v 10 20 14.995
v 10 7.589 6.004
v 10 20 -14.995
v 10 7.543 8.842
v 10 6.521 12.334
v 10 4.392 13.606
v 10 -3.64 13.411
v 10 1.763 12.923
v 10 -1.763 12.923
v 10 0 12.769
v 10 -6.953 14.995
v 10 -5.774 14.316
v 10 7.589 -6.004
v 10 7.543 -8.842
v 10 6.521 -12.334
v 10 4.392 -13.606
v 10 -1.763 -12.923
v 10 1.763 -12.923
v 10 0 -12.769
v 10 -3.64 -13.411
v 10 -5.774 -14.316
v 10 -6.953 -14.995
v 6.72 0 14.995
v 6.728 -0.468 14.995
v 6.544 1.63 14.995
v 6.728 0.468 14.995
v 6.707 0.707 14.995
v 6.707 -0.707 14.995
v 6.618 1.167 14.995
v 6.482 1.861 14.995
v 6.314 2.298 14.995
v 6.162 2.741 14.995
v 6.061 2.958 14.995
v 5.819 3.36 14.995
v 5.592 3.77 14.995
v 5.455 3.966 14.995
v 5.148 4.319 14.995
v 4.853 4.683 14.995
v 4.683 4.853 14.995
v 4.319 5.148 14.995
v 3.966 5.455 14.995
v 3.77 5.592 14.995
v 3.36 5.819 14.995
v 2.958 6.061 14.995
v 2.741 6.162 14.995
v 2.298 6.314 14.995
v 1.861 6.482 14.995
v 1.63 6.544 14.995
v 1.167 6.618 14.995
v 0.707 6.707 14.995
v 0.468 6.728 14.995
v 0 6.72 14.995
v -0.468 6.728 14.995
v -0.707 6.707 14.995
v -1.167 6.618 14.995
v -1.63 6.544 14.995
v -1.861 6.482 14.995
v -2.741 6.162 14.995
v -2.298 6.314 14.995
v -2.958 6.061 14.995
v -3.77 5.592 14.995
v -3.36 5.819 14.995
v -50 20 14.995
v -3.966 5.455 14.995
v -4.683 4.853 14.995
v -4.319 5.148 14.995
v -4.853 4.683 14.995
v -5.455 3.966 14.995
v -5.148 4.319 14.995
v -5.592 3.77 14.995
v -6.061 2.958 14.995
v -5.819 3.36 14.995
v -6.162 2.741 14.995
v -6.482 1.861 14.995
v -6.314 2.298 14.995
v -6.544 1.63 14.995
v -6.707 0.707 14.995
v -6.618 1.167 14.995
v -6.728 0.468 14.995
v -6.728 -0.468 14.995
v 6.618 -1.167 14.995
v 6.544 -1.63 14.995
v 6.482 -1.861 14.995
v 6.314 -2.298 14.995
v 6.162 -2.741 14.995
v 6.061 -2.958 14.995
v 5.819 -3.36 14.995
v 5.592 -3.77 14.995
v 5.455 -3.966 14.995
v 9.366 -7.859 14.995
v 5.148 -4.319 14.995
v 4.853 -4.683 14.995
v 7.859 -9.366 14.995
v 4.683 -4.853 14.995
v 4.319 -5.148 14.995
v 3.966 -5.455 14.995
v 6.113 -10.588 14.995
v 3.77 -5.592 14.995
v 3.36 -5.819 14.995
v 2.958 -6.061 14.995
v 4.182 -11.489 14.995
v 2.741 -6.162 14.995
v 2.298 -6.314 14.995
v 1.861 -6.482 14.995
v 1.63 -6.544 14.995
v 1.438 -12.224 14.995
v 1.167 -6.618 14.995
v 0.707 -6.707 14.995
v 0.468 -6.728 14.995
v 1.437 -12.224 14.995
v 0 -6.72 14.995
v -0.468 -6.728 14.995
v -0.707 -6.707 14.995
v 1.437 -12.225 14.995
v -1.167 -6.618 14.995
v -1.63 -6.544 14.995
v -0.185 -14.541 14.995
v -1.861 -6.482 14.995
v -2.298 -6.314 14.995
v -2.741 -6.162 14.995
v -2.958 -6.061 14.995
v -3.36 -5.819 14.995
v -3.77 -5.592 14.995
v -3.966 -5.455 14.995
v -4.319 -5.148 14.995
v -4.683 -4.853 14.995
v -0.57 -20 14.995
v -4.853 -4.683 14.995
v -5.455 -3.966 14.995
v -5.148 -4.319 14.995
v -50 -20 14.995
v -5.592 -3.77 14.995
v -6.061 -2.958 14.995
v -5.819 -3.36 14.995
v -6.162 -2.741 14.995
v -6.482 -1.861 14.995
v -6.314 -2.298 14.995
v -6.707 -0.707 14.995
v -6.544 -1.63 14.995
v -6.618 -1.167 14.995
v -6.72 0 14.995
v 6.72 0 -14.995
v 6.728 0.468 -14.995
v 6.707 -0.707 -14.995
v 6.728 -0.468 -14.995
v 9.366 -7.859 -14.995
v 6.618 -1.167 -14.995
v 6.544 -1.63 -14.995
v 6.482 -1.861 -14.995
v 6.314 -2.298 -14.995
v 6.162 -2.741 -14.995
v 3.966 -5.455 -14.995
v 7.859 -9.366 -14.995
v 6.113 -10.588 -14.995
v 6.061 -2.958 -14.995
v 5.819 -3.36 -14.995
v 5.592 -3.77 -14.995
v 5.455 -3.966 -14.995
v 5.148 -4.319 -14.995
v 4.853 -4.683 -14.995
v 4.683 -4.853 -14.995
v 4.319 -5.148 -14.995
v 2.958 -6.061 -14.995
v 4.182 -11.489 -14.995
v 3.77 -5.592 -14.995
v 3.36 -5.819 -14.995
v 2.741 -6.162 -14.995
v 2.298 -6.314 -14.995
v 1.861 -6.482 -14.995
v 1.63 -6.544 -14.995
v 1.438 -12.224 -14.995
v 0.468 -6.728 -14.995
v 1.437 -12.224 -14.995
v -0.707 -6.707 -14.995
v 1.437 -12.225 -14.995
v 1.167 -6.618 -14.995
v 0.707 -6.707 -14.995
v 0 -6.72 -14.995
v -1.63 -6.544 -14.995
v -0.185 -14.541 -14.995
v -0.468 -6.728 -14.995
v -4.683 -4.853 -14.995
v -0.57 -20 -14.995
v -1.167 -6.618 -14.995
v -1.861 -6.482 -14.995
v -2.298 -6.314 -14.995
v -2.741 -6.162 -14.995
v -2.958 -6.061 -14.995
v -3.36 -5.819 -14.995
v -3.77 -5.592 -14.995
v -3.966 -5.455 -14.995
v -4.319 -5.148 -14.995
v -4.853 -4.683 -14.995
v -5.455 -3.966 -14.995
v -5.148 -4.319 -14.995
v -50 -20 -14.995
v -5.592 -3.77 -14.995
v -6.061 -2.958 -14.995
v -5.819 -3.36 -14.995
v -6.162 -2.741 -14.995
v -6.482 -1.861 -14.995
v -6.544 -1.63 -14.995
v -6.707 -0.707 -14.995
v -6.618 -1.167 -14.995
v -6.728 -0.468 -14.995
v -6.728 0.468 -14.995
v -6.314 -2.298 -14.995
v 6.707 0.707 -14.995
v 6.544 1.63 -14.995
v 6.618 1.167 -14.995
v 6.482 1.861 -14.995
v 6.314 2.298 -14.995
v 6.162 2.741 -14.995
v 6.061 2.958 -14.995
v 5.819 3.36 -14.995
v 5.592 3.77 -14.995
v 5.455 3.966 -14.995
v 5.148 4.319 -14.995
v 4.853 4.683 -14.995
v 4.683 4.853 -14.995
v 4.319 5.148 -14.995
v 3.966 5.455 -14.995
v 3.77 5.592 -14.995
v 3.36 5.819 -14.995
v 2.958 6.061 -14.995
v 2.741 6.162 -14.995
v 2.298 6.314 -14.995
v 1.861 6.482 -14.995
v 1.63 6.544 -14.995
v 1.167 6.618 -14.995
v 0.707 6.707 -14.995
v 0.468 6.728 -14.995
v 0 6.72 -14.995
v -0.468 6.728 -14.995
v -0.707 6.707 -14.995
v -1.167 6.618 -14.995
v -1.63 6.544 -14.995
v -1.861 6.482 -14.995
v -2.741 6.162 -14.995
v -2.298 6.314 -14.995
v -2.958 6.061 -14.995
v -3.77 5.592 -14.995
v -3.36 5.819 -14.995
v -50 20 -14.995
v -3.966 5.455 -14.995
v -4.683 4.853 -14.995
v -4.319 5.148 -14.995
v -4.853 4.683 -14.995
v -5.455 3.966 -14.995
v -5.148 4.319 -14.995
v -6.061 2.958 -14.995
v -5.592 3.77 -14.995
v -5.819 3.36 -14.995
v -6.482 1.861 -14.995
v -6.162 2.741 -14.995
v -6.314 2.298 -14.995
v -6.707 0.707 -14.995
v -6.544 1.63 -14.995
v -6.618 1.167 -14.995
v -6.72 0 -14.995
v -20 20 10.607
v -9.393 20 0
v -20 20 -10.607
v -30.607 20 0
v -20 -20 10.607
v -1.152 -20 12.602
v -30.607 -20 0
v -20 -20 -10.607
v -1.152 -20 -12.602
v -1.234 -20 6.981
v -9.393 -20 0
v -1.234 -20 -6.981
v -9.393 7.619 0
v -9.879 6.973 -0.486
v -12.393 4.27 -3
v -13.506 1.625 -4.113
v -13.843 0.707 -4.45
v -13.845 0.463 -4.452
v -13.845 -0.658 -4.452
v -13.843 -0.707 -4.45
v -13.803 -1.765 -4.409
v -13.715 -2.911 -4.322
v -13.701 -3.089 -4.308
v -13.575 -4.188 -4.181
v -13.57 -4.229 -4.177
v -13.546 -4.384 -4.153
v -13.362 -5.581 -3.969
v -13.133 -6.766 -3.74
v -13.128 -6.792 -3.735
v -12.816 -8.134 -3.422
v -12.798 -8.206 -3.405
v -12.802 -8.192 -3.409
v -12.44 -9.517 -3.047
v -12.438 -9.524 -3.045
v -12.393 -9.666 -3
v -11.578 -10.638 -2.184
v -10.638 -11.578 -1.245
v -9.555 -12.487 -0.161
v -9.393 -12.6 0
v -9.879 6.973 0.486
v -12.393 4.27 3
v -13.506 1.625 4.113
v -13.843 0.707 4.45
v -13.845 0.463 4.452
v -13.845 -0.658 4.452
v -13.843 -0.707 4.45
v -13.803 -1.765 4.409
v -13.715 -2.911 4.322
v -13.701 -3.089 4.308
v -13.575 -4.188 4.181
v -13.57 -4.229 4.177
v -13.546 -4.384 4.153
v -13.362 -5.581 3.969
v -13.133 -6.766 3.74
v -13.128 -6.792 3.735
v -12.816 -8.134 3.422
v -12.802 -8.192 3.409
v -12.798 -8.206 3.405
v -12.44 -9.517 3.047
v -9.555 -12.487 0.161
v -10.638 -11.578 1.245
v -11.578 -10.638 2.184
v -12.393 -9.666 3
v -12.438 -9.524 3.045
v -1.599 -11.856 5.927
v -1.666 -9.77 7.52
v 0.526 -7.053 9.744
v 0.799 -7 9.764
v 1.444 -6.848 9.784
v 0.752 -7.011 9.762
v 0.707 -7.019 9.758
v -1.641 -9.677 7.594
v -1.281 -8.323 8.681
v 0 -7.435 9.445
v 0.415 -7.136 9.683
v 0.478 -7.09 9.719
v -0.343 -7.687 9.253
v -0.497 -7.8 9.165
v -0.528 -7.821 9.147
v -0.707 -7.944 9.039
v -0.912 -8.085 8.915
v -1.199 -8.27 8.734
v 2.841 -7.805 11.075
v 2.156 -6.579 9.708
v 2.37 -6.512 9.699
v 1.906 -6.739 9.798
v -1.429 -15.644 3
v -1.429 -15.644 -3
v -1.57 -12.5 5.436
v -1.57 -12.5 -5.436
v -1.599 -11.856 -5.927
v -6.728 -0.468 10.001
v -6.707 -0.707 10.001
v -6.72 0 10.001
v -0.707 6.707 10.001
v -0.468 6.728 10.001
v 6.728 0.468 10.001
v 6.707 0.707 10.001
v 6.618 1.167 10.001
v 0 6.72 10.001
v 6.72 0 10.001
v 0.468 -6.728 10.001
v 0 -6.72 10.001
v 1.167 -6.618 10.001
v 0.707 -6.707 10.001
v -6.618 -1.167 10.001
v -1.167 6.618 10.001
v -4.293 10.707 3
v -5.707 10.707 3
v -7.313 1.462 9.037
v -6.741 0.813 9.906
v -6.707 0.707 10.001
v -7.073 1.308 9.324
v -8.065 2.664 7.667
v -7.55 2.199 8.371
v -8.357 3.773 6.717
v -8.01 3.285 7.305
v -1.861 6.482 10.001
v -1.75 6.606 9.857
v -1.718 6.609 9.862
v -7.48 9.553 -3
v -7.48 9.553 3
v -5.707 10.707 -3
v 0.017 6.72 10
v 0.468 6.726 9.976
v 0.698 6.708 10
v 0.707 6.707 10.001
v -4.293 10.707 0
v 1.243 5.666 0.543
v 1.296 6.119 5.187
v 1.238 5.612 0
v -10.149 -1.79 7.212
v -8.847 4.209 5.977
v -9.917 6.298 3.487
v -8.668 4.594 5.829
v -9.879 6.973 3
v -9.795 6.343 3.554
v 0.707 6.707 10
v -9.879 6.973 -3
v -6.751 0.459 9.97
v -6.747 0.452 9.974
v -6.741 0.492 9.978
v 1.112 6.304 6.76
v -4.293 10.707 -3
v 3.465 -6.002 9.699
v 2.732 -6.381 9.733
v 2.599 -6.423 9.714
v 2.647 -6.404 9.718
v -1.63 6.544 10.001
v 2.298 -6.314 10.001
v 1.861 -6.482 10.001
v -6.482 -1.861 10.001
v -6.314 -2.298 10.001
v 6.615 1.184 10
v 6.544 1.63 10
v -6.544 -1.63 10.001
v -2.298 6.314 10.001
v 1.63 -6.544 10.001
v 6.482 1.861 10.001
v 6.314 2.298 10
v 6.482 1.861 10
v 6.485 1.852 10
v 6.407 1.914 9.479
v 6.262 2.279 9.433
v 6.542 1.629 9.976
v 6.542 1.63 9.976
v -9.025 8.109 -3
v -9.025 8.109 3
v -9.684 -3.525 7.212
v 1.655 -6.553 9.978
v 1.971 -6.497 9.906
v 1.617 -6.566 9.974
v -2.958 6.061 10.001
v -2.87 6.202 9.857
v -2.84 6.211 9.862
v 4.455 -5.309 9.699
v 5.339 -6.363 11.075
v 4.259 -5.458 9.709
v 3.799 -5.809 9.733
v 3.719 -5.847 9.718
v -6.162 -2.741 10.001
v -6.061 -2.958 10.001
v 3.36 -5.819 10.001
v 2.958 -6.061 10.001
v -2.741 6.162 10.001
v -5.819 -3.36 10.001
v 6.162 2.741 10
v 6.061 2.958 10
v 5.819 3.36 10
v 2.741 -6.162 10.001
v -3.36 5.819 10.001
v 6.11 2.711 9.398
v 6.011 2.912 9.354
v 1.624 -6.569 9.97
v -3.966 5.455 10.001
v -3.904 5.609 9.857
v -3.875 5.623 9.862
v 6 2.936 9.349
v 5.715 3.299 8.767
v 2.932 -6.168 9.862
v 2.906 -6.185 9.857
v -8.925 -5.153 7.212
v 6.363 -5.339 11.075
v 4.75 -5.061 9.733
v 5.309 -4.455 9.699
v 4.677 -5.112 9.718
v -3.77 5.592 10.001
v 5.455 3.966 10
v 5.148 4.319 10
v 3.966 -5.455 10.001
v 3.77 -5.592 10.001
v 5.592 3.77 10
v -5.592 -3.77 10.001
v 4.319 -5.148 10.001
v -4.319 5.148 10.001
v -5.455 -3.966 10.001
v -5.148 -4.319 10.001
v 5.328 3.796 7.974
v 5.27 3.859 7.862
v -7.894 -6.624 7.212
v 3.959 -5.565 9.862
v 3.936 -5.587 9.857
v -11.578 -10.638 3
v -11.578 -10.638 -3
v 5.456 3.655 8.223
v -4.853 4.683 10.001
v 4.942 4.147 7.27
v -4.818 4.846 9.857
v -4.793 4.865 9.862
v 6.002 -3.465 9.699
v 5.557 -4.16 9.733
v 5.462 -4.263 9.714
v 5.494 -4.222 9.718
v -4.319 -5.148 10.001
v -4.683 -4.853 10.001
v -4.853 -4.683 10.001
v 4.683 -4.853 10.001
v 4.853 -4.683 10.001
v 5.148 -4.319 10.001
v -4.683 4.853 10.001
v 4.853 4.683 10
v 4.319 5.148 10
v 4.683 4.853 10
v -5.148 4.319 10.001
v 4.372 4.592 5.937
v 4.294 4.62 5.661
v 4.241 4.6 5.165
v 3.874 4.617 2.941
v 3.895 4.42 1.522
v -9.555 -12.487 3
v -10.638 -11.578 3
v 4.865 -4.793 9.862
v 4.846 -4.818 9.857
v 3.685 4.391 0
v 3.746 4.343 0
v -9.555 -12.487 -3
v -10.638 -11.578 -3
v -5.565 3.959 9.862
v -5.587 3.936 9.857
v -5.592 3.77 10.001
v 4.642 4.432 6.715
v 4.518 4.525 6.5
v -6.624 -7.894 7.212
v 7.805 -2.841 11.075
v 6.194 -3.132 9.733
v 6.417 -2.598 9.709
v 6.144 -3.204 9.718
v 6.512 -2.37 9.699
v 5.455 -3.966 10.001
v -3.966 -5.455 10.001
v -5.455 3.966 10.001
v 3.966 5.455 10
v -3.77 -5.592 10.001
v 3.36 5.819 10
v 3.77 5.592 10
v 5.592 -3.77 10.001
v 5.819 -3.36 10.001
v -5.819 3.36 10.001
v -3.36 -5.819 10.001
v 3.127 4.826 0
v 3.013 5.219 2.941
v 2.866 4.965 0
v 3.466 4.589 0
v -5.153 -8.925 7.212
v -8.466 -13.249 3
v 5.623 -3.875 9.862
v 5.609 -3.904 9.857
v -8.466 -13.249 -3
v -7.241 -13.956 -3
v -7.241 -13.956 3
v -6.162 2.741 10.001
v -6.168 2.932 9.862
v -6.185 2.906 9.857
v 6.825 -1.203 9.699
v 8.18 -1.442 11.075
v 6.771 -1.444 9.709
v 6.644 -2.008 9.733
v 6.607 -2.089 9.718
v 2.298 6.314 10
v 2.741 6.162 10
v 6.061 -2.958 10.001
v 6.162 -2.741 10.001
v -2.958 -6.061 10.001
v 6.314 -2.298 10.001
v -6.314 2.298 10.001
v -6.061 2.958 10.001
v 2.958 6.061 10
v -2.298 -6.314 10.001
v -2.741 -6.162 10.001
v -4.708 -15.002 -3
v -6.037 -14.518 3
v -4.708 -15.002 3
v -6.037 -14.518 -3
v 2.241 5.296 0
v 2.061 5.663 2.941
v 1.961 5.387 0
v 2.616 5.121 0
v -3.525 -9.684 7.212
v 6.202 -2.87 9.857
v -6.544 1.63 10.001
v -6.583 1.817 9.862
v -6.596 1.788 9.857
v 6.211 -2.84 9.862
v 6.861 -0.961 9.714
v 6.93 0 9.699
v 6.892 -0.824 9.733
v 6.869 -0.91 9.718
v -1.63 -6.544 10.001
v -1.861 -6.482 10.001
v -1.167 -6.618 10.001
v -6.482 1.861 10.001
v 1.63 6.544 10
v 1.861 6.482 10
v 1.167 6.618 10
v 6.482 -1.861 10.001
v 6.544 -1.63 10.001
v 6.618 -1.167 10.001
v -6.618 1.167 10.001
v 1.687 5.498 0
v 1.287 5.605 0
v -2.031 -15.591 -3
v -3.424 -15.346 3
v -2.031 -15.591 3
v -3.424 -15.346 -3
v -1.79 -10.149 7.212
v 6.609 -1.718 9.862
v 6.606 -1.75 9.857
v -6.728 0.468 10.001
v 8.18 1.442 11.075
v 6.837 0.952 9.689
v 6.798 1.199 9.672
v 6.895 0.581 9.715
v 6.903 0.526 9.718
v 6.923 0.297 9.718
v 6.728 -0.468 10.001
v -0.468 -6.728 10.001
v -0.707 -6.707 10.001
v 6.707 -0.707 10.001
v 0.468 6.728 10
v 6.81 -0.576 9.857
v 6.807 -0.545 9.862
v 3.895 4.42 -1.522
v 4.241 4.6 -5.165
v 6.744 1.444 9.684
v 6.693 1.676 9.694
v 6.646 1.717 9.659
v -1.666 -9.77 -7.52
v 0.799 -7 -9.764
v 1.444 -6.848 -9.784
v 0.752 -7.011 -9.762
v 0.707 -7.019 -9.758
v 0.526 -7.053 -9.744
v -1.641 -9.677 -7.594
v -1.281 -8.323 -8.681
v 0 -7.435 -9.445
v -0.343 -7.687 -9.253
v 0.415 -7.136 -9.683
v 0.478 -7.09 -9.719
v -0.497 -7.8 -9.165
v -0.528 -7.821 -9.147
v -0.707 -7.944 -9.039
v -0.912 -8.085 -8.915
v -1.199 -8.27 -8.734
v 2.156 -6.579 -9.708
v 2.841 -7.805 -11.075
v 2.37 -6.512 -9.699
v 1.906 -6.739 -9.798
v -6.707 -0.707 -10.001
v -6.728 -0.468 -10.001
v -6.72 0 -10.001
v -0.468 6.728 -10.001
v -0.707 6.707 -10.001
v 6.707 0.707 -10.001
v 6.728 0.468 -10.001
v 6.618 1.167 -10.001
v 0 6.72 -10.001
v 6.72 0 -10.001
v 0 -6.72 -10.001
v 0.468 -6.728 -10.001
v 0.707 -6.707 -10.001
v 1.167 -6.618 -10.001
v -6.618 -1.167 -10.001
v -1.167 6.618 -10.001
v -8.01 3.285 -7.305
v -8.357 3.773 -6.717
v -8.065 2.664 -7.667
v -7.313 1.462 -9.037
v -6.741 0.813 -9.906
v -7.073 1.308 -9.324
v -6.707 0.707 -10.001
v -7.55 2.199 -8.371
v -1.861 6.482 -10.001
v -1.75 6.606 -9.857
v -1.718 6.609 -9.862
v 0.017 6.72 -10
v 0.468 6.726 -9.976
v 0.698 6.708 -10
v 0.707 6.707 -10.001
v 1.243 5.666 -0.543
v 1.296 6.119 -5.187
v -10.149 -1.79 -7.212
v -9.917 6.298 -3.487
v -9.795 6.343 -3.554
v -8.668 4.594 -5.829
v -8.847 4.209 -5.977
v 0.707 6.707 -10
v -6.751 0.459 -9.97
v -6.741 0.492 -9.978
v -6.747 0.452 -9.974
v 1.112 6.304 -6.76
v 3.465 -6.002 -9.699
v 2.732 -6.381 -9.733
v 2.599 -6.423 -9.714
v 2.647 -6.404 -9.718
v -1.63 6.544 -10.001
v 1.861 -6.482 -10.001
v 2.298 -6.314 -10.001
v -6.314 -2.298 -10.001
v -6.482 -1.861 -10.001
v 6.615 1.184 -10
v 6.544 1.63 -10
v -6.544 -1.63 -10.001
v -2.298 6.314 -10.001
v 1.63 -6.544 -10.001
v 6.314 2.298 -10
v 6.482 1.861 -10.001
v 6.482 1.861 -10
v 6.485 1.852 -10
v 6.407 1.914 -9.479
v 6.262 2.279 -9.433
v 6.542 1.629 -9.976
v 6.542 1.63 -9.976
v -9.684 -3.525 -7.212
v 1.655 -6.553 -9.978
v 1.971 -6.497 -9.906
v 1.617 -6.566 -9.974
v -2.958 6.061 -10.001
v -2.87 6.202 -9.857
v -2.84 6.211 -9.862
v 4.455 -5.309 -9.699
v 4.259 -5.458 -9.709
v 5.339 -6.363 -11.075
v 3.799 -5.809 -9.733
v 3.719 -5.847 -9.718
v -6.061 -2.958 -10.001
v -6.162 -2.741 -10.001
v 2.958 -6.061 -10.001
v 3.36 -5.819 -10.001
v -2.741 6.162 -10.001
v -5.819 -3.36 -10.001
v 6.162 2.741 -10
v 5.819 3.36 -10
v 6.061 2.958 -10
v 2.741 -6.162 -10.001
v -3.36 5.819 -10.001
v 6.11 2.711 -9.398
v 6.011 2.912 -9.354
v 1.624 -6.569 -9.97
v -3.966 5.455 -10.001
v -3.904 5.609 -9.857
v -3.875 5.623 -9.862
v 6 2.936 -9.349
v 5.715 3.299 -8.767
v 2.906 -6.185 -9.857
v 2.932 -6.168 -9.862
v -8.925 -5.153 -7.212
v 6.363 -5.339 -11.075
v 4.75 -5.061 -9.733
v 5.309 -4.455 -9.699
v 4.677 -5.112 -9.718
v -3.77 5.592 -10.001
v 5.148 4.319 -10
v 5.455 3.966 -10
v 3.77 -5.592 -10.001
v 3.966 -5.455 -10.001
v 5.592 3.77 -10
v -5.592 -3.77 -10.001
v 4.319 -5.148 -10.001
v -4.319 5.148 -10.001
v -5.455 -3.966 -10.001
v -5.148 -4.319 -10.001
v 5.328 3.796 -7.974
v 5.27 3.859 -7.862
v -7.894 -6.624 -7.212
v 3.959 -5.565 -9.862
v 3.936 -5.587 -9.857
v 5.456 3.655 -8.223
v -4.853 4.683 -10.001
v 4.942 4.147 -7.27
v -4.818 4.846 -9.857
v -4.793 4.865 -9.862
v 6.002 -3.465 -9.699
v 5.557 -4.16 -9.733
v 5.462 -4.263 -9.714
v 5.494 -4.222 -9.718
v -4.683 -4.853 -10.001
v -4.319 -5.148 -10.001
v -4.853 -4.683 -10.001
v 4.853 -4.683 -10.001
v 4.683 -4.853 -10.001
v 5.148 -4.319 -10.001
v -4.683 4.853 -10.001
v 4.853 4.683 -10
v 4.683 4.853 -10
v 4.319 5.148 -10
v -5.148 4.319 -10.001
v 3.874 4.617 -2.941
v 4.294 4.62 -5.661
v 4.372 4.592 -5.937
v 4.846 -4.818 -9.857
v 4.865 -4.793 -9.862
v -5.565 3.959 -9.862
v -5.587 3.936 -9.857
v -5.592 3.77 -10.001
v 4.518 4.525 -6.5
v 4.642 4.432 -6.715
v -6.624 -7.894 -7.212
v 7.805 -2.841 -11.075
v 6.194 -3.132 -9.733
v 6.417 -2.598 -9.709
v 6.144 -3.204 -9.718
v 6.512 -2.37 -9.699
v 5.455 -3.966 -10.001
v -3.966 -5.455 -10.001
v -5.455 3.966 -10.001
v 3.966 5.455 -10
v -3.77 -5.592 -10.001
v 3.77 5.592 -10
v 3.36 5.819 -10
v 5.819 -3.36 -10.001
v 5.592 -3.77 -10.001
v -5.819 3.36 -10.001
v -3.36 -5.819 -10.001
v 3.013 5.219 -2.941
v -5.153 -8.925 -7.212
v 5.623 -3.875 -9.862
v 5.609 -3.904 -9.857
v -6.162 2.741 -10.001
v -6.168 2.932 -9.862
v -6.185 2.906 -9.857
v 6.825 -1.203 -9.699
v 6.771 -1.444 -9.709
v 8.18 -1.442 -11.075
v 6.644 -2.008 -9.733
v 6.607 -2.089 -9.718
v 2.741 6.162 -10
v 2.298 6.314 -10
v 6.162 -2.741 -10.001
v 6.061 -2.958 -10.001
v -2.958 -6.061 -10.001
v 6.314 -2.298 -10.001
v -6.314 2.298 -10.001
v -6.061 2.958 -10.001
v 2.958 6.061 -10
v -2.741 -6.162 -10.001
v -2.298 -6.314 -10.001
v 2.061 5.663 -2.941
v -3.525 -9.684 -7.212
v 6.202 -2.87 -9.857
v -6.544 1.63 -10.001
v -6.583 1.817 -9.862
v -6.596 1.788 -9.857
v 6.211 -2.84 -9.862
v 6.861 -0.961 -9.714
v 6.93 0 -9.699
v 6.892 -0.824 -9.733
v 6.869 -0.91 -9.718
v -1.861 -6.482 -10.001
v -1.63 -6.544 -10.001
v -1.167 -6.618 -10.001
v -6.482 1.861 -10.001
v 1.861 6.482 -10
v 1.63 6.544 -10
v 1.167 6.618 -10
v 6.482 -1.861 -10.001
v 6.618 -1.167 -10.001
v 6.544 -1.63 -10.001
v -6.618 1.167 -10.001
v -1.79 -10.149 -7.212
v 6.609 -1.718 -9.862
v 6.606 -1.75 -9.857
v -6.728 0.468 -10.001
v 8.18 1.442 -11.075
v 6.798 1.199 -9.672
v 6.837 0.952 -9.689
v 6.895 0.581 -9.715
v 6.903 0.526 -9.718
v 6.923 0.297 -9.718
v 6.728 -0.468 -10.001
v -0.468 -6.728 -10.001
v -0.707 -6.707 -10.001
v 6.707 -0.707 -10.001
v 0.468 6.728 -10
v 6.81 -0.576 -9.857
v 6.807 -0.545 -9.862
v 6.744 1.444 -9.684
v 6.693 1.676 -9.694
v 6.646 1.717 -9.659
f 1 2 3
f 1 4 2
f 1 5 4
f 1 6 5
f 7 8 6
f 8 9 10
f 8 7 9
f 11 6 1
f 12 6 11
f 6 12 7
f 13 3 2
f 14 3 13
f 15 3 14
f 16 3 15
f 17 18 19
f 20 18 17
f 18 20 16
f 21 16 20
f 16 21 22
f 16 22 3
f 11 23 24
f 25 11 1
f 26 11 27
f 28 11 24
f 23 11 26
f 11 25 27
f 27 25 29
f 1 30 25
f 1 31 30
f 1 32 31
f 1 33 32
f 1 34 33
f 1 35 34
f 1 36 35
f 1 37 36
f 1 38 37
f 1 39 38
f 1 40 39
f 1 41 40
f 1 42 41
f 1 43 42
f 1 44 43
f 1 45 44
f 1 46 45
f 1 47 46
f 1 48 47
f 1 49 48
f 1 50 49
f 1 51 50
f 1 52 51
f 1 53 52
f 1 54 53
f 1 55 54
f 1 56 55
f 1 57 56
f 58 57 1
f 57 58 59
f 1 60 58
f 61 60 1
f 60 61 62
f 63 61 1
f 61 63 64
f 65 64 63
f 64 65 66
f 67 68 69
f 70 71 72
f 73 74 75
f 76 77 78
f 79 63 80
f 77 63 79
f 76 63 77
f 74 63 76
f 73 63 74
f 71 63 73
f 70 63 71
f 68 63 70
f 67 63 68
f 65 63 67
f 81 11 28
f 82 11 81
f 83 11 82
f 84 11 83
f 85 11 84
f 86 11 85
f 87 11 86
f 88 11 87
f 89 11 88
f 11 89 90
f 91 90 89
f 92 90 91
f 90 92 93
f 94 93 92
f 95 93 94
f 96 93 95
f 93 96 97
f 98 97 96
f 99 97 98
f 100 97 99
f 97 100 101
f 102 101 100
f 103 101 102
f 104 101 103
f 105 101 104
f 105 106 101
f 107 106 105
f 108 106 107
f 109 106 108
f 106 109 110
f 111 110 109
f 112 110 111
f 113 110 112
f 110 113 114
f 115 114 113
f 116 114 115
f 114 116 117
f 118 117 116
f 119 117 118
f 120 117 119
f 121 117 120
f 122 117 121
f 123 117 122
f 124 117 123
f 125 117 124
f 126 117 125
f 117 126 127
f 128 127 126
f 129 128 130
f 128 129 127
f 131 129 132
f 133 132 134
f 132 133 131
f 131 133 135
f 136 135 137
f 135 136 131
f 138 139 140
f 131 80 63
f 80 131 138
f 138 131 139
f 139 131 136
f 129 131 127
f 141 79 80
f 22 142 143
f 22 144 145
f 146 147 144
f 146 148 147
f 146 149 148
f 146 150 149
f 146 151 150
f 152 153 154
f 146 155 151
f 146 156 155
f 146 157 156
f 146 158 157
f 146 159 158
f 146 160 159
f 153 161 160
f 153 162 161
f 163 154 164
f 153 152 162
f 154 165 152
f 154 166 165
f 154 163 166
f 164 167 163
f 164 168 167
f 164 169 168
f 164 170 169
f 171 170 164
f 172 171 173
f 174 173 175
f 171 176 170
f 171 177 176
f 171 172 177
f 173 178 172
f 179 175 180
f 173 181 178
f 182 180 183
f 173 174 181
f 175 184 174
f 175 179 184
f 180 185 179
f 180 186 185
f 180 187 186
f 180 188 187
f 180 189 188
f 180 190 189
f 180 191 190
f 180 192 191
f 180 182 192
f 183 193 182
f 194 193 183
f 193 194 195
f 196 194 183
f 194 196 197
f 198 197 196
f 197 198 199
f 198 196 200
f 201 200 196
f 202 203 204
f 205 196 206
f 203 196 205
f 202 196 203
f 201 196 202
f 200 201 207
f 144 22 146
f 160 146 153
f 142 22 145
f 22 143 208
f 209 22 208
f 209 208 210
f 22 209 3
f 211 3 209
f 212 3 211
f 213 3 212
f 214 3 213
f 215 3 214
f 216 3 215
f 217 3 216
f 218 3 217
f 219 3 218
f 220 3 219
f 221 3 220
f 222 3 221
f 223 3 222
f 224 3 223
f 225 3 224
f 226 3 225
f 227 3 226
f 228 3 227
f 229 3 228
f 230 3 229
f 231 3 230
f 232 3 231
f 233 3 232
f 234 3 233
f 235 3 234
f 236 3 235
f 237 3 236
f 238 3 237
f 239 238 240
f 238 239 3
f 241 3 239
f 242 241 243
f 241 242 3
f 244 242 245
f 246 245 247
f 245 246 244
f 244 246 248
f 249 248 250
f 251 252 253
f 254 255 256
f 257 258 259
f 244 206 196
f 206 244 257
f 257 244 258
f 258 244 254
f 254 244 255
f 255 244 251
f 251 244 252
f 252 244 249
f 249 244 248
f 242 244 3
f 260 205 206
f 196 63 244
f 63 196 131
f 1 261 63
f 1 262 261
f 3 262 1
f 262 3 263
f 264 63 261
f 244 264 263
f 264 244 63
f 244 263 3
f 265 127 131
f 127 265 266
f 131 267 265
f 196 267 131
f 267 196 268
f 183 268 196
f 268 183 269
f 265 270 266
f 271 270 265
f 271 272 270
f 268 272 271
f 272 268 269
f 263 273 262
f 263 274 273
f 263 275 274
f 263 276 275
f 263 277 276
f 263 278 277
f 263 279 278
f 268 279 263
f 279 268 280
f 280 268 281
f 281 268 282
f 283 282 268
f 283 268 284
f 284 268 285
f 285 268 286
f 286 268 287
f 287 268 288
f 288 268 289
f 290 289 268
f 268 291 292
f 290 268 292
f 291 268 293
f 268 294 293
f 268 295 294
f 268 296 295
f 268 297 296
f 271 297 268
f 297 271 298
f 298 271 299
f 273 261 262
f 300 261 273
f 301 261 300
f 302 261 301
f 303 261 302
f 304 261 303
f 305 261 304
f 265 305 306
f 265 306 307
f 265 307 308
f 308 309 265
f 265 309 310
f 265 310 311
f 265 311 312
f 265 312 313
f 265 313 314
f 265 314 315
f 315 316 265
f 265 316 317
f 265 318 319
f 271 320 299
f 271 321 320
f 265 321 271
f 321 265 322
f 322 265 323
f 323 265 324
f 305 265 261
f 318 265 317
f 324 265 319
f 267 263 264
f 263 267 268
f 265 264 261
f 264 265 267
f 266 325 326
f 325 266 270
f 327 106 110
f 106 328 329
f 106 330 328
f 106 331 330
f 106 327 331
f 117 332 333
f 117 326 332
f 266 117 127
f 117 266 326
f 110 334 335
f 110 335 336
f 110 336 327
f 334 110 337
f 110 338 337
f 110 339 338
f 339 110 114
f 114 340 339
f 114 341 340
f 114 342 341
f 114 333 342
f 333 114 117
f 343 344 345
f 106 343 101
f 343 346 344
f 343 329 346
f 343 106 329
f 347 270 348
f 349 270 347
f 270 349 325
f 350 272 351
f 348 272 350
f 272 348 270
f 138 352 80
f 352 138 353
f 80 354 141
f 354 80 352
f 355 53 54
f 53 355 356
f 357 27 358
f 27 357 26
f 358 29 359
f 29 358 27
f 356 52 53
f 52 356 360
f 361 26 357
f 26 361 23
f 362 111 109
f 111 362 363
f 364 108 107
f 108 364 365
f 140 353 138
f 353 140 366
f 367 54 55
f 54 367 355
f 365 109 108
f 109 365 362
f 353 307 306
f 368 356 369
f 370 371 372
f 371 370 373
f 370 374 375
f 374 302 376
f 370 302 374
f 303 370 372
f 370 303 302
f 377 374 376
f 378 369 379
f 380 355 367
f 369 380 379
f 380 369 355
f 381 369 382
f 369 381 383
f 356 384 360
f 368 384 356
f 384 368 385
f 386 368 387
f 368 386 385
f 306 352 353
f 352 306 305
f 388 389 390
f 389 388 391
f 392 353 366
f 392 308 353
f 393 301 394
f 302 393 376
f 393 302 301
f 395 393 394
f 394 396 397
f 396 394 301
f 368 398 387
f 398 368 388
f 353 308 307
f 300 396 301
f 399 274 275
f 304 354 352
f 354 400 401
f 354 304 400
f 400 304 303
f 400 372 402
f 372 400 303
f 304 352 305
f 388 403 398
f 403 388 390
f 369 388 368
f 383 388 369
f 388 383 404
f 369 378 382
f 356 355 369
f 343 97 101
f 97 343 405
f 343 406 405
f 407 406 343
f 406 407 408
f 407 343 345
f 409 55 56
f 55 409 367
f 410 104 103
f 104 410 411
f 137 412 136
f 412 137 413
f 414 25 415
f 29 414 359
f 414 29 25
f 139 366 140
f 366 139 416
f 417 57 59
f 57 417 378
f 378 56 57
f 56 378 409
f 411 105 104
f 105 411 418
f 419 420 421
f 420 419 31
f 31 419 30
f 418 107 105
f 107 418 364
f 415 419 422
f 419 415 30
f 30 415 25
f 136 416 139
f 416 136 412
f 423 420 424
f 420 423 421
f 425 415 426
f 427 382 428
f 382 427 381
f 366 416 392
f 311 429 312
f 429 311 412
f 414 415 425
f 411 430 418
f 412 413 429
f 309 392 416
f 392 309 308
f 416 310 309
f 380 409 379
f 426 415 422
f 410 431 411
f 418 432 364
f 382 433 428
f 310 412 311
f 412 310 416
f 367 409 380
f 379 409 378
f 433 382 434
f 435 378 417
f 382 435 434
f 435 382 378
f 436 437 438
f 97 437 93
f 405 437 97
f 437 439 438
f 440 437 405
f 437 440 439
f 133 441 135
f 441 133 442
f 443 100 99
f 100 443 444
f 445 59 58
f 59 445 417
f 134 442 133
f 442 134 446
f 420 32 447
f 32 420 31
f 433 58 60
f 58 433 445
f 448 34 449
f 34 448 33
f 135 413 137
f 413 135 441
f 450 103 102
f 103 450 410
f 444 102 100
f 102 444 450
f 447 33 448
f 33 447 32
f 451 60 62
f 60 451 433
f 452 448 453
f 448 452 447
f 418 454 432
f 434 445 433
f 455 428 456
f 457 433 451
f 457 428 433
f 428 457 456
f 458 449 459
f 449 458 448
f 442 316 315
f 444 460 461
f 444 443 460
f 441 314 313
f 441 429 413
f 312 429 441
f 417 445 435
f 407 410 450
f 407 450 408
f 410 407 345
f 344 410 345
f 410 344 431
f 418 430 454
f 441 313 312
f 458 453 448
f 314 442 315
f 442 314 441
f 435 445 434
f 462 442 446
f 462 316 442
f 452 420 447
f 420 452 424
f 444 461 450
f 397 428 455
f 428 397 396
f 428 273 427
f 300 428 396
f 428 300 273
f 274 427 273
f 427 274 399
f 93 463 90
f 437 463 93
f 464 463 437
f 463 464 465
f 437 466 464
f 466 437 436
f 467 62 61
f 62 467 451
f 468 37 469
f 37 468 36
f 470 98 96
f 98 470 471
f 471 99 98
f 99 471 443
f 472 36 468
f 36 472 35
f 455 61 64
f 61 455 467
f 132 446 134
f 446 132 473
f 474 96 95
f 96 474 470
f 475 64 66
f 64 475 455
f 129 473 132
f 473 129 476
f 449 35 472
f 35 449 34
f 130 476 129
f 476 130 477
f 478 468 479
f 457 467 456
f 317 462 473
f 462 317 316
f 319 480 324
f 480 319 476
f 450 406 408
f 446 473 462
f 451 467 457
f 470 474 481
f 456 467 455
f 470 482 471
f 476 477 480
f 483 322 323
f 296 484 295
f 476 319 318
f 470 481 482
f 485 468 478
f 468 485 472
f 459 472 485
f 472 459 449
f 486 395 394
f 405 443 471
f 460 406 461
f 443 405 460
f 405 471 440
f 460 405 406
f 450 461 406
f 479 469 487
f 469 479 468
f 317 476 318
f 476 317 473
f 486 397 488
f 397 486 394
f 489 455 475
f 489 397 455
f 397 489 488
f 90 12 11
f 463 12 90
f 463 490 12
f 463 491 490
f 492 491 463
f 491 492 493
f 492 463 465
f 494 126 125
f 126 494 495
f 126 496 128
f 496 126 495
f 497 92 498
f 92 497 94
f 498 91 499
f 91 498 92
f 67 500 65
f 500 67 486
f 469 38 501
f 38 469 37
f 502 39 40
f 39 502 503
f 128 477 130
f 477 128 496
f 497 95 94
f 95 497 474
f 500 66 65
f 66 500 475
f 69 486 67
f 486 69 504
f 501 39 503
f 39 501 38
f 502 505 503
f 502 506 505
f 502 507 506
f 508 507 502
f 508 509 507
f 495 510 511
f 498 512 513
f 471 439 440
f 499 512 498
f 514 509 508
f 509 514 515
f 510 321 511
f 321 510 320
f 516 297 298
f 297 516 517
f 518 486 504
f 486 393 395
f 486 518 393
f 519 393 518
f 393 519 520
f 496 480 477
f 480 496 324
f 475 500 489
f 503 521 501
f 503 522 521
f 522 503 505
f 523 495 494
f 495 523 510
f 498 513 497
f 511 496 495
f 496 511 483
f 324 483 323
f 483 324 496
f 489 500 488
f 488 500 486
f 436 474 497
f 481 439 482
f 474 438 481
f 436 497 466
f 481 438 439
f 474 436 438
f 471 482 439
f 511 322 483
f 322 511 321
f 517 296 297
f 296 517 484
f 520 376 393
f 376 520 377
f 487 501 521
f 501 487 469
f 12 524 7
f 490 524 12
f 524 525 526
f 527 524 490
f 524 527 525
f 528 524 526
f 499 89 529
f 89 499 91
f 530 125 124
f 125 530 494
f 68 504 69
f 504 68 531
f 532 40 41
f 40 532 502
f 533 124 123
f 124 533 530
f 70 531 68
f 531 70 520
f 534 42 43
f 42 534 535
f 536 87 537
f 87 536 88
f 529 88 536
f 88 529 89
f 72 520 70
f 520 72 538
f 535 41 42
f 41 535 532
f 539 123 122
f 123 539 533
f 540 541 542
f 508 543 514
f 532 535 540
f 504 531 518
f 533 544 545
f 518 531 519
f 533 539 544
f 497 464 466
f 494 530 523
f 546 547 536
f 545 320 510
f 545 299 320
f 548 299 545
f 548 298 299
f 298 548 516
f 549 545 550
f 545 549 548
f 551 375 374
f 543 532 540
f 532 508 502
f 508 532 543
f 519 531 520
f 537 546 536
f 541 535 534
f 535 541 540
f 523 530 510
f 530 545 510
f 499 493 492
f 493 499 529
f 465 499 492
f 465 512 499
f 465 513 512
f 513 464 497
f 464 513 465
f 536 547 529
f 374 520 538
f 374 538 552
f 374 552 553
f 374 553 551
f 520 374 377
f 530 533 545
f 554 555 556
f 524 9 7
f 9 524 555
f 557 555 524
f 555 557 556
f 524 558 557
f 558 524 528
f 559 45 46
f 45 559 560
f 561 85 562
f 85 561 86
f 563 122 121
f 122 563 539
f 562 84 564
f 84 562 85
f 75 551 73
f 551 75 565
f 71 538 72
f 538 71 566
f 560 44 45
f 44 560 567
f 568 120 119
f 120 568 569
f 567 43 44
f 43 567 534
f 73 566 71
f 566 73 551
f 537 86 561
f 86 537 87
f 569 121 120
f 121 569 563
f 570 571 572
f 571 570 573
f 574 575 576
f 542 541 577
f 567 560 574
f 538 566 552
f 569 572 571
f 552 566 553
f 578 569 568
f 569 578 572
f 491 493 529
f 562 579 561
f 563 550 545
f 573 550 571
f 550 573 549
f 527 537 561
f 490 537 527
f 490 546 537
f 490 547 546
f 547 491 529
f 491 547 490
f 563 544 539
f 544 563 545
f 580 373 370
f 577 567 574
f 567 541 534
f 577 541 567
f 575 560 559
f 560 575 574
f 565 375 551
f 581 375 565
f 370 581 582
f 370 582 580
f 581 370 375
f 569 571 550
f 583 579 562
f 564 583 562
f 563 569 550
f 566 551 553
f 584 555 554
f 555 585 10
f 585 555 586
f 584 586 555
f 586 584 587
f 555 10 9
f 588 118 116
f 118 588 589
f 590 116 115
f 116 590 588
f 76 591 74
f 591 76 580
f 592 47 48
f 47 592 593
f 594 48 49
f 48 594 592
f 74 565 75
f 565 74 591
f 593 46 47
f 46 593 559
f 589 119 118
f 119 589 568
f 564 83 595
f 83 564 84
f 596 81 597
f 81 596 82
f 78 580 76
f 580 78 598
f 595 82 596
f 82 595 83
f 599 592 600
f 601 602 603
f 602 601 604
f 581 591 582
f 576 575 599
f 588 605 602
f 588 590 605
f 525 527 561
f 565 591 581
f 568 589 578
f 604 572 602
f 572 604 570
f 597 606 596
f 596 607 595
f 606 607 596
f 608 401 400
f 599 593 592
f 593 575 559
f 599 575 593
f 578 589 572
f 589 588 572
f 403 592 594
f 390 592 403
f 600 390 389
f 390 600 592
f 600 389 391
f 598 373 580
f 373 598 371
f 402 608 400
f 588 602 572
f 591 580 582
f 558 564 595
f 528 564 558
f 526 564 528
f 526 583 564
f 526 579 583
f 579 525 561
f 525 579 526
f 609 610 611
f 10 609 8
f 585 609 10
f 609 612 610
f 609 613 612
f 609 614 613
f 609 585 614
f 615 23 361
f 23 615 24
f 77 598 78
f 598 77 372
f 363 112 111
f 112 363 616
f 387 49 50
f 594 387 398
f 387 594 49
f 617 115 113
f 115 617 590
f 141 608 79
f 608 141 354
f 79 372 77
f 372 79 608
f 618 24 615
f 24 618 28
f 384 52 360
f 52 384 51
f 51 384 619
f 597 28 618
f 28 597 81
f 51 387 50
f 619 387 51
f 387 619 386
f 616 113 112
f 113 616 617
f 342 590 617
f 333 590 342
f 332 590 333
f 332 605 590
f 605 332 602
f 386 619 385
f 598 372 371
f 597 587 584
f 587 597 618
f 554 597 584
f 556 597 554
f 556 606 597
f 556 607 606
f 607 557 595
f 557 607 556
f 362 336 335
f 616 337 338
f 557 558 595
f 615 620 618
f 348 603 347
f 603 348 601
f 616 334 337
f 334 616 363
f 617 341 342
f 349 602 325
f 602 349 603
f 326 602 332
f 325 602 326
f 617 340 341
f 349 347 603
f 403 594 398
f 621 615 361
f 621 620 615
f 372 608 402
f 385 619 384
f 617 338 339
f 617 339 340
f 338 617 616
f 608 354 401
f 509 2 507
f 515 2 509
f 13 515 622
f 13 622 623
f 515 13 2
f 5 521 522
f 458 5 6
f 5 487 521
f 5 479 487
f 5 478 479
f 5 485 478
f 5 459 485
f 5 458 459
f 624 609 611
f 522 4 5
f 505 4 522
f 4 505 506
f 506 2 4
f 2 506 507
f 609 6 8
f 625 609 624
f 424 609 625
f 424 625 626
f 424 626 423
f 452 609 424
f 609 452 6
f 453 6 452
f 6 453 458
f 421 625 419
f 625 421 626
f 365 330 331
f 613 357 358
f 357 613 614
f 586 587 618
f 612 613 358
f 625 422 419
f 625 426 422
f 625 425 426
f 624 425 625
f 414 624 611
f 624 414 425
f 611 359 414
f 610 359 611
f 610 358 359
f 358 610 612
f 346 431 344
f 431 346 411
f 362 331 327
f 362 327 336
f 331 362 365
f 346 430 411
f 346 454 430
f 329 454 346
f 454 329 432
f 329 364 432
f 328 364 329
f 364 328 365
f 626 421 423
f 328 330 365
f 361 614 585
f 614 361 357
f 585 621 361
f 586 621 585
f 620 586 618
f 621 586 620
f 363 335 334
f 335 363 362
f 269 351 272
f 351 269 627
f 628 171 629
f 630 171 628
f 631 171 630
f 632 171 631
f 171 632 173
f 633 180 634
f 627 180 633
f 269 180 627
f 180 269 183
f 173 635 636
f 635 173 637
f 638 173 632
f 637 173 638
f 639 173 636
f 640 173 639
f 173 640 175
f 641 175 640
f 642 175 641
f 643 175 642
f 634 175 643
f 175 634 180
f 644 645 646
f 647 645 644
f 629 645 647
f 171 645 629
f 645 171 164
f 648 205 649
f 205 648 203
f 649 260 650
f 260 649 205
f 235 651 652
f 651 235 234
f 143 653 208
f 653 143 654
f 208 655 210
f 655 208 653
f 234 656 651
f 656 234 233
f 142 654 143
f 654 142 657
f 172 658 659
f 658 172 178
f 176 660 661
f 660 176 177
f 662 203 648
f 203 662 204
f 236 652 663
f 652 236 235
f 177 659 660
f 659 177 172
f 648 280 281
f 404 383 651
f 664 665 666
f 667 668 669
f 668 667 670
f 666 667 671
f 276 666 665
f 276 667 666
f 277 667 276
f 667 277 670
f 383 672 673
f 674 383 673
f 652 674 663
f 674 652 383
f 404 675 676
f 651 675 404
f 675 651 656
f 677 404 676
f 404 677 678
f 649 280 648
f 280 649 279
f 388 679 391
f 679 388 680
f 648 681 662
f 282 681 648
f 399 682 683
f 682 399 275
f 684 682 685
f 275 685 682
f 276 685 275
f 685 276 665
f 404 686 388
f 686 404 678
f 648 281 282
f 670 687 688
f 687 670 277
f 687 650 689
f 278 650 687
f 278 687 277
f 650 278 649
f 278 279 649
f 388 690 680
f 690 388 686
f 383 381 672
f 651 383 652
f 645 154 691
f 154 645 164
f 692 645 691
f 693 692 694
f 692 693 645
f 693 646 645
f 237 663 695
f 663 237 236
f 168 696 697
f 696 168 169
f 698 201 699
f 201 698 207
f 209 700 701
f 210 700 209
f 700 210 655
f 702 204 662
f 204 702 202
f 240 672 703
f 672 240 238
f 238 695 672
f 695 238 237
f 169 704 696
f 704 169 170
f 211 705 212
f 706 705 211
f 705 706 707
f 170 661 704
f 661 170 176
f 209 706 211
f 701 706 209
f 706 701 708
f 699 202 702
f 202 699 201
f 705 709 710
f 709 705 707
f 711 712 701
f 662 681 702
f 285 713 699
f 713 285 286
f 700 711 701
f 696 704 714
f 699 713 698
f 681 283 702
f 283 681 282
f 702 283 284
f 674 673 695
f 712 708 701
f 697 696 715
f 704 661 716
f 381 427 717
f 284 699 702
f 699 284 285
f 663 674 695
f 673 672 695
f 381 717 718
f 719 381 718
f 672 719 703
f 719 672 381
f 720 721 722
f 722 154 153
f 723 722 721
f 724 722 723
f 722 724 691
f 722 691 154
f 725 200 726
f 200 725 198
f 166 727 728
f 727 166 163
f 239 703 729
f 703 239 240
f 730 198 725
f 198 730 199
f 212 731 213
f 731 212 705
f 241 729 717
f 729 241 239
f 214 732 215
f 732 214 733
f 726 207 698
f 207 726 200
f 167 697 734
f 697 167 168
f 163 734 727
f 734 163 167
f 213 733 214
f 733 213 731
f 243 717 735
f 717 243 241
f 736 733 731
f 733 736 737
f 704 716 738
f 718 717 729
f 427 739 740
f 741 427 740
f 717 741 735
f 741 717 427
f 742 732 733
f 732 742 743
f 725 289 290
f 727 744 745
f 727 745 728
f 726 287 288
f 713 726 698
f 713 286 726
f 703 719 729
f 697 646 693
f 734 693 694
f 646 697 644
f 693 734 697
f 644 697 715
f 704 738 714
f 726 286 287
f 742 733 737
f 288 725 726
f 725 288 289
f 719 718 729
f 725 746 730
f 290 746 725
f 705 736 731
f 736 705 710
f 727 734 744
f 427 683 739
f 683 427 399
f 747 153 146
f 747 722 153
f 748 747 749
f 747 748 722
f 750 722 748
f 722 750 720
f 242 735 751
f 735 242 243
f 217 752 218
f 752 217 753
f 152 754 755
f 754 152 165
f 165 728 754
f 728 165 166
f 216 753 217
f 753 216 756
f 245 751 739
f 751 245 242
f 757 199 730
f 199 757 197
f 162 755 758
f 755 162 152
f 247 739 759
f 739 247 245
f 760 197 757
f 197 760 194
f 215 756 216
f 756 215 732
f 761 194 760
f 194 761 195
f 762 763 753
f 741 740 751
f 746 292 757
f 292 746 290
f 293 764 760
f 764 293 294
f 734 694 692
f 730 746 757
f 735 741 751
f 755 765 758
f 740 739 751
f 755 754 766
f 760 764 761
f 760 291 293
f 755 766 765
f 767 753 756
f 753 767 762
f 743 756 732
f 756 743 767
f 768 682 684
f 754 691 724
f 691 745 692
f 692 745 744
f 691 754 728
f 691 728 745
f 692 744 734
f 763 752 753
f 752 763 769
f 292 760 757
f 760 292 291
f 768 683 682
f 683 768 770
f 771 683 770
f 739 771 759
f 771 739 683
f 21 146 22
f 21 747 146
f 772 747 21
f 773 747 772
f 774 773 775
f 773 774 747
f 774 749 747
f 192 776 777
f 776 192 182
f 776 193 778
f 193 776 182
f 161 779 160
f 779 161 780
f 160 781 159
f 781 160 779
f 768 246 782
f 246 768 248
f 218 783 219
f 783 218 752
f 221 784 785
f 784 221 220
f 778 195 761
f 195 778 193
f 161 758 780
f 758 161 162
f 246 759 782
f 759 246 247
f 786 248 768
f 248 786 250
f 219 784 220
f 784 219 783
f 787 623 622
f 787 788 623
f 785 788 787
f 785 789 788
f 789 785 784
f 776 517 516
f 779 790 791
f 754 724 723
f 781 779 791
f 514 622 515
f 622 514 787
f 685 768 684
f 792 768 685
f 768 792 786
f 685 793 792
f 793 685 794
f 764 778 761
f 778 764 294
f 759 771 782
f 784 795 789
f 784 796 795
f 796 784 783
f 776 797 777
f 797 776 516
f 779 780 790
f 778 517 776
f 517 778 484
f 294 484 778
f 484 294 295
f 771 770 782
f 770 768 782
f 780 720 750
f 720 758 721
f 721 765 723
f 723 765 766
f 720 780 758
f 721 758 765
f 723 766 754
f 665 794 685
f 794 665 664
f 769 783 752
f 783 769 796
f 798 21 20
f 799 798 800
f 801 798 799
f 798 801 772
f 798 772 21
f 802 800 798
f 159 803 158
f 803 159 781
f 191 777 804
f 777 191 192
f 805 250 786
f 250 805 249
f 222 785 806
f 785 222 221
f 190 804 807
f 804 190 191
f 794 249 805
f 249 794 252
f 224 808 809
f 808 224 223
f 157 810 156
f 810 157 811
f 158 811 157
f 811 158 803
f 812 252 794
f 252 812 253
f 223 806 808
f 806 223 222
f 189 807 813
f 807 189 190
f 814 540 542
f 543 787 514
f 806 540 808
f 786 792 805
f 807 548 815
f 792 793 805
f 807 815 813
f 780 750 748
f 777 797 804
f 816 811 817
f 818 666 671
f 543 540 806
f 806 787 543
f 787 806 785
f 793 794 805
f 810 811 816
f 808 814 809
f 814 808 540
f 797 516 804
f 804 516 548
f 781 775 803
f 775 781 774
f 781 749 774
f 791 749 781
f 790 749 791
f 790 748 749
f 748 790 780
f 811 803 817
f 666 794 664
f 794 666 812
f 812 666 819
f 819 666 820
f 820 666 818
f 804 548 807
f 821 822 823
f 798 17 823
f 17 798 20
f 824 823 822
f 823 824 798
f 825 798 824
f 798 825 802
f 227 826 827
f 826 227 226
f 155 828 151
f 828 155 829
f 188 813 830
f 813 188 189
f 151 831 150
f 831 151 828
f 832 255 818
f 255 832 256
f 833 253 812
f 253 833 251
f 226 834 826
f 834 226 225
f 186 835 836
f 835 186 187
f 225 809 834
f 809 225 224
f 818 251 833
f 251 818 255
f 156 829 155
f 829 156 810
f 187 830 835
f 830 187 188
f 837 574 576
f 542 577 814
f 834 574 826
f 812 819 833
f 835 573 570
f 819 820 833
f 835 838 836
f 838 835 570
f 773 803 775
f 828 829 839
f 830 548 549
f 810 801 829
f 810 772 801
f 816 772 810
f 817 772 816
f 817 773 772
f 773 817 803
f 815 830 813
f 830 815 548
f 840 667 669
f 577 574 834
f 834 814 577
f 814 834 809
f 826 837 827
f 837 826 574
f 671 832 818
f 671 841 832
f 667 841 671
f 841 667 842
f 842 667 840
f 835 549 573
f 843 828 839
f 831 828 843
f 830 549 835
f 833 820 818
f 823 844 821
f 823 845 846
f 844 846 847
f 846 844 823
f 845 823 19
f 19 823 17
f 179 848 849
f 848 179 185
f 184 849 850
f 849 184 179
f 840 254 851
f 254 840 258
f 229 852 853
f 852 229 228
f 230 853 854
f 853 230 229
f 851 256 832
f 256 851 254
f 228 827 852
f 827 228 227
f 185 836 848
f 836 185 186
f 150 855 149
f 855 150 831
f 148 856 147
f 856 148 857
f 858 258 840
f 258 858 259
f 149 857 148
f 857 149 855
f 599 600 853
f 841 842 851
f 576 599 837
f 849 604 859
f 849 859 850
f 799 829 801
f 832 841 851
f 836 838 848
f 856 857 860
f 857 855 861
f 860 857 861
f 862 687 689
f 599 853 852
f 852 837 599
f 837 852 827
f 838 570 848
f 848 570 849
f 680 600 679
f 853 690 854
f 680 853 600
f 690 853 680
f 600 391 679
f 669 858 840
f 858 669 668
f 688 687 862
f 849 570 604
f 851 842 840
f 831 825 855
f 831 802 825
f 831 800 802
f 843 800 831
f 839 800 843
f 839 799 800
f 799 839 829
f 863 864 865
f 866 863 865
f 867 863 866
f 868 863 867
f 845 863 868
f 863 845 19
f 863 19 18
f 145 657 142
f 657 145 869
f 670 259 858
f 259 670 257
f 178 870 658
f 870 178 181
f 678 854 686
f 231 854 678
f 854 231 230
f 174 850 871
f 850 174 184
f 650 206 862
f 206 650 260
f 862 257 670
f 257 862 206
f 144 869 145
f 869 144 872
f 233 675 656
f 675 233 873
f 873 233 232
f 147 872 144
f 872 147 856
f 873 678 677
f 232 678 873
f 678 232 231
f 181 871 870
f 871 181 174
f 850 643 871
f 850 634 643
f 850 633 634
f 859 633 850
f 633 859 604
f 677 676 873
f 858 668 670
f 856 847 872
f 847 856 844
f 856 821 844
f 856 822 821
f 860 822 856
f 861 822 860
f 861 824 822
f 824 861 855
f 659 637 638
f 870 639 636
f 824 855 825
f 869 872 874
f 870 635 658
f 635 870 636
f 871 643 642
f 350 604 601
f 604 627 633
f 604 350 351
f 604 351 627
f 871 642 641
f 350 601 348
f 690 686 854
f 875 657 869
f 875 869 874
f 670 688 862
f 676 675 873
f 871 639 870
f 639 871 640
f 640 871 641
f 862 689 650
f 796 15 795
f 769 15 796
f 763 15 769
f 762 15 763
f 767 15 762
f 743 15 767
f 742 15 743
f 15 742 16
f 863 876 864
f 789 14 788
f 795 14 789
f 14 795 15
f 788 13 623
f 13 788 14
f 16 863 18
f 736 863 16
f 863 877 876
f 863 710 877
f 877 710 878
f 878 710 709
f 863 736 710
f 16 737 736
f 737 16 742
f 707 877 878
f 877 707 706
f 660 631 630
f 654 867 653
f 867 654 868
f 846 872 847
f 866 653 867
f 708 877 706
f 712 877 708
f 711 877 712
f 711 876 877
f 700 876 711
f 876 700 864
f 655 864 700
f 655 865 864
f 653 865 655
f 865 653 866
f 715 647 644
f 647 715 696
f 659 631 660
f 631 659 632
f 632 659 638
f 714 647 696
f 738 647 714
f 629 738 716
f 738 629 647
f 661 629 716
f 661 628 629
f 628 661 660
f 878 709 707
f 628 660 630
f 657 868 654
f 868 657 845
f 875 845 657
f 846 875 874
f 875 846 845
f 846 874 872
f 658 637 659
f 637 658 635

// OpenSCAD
difference(){body();
cut();}

module m(r){
    offset(r/2,$fn=4){
        children();
        }
    }

module body(){ translate([-20,0,0])color("red")difference(){
    cube([60,40,29.99],center=true);
rotate([0,45,0])    cube([15,50,15],center=true);


}
}
module cut(r){
    
    diff(r);
    mirror([0,0,1])diff(r);
    }



module diff(m){
for (r=[0:10:90])
{
    hull (){rotate(r) brat1(m);rotate(r+10)brat1(m);}
hull (){rotate(r)brat2(m);rotate(r+10)brat2(m);}
hull (){rotate(r)brat3(m);rotate(r+10)brat3(m);}
}

}
module hasp(){
mirror([0,0,1]){
brat1();
brat2();
brat3();
}
    
brat1();
brat2();
brat3();
    }



module brat1(m=0){translate([-5,0,0]){
 
translate([5,0,0])
rotate(-80)hull(){
translate([5,0,0])linear_extrude(5)m(m)circle(2);
translate([15,0,0])linear_extrude(15)m(m)circle(2);
translate([25,0,0])linear_extrude(15)m(m)circle(4.5);
translate([28,0,0])linear_extrude(8)m(m)circle(5);
}
}}

module brat2(m=0){translate([-5,0,0]){

translate([5,0,10])linear_extrude(5)m(m)circle(6);


}}


module brat3(m=0){translate([-5,0,0]){
    hull(){linear_extrude(3)m(m)circle(10);
translate([5,0,10])linear_extrude(0.0011)m(m)circle(6);
}

}}
